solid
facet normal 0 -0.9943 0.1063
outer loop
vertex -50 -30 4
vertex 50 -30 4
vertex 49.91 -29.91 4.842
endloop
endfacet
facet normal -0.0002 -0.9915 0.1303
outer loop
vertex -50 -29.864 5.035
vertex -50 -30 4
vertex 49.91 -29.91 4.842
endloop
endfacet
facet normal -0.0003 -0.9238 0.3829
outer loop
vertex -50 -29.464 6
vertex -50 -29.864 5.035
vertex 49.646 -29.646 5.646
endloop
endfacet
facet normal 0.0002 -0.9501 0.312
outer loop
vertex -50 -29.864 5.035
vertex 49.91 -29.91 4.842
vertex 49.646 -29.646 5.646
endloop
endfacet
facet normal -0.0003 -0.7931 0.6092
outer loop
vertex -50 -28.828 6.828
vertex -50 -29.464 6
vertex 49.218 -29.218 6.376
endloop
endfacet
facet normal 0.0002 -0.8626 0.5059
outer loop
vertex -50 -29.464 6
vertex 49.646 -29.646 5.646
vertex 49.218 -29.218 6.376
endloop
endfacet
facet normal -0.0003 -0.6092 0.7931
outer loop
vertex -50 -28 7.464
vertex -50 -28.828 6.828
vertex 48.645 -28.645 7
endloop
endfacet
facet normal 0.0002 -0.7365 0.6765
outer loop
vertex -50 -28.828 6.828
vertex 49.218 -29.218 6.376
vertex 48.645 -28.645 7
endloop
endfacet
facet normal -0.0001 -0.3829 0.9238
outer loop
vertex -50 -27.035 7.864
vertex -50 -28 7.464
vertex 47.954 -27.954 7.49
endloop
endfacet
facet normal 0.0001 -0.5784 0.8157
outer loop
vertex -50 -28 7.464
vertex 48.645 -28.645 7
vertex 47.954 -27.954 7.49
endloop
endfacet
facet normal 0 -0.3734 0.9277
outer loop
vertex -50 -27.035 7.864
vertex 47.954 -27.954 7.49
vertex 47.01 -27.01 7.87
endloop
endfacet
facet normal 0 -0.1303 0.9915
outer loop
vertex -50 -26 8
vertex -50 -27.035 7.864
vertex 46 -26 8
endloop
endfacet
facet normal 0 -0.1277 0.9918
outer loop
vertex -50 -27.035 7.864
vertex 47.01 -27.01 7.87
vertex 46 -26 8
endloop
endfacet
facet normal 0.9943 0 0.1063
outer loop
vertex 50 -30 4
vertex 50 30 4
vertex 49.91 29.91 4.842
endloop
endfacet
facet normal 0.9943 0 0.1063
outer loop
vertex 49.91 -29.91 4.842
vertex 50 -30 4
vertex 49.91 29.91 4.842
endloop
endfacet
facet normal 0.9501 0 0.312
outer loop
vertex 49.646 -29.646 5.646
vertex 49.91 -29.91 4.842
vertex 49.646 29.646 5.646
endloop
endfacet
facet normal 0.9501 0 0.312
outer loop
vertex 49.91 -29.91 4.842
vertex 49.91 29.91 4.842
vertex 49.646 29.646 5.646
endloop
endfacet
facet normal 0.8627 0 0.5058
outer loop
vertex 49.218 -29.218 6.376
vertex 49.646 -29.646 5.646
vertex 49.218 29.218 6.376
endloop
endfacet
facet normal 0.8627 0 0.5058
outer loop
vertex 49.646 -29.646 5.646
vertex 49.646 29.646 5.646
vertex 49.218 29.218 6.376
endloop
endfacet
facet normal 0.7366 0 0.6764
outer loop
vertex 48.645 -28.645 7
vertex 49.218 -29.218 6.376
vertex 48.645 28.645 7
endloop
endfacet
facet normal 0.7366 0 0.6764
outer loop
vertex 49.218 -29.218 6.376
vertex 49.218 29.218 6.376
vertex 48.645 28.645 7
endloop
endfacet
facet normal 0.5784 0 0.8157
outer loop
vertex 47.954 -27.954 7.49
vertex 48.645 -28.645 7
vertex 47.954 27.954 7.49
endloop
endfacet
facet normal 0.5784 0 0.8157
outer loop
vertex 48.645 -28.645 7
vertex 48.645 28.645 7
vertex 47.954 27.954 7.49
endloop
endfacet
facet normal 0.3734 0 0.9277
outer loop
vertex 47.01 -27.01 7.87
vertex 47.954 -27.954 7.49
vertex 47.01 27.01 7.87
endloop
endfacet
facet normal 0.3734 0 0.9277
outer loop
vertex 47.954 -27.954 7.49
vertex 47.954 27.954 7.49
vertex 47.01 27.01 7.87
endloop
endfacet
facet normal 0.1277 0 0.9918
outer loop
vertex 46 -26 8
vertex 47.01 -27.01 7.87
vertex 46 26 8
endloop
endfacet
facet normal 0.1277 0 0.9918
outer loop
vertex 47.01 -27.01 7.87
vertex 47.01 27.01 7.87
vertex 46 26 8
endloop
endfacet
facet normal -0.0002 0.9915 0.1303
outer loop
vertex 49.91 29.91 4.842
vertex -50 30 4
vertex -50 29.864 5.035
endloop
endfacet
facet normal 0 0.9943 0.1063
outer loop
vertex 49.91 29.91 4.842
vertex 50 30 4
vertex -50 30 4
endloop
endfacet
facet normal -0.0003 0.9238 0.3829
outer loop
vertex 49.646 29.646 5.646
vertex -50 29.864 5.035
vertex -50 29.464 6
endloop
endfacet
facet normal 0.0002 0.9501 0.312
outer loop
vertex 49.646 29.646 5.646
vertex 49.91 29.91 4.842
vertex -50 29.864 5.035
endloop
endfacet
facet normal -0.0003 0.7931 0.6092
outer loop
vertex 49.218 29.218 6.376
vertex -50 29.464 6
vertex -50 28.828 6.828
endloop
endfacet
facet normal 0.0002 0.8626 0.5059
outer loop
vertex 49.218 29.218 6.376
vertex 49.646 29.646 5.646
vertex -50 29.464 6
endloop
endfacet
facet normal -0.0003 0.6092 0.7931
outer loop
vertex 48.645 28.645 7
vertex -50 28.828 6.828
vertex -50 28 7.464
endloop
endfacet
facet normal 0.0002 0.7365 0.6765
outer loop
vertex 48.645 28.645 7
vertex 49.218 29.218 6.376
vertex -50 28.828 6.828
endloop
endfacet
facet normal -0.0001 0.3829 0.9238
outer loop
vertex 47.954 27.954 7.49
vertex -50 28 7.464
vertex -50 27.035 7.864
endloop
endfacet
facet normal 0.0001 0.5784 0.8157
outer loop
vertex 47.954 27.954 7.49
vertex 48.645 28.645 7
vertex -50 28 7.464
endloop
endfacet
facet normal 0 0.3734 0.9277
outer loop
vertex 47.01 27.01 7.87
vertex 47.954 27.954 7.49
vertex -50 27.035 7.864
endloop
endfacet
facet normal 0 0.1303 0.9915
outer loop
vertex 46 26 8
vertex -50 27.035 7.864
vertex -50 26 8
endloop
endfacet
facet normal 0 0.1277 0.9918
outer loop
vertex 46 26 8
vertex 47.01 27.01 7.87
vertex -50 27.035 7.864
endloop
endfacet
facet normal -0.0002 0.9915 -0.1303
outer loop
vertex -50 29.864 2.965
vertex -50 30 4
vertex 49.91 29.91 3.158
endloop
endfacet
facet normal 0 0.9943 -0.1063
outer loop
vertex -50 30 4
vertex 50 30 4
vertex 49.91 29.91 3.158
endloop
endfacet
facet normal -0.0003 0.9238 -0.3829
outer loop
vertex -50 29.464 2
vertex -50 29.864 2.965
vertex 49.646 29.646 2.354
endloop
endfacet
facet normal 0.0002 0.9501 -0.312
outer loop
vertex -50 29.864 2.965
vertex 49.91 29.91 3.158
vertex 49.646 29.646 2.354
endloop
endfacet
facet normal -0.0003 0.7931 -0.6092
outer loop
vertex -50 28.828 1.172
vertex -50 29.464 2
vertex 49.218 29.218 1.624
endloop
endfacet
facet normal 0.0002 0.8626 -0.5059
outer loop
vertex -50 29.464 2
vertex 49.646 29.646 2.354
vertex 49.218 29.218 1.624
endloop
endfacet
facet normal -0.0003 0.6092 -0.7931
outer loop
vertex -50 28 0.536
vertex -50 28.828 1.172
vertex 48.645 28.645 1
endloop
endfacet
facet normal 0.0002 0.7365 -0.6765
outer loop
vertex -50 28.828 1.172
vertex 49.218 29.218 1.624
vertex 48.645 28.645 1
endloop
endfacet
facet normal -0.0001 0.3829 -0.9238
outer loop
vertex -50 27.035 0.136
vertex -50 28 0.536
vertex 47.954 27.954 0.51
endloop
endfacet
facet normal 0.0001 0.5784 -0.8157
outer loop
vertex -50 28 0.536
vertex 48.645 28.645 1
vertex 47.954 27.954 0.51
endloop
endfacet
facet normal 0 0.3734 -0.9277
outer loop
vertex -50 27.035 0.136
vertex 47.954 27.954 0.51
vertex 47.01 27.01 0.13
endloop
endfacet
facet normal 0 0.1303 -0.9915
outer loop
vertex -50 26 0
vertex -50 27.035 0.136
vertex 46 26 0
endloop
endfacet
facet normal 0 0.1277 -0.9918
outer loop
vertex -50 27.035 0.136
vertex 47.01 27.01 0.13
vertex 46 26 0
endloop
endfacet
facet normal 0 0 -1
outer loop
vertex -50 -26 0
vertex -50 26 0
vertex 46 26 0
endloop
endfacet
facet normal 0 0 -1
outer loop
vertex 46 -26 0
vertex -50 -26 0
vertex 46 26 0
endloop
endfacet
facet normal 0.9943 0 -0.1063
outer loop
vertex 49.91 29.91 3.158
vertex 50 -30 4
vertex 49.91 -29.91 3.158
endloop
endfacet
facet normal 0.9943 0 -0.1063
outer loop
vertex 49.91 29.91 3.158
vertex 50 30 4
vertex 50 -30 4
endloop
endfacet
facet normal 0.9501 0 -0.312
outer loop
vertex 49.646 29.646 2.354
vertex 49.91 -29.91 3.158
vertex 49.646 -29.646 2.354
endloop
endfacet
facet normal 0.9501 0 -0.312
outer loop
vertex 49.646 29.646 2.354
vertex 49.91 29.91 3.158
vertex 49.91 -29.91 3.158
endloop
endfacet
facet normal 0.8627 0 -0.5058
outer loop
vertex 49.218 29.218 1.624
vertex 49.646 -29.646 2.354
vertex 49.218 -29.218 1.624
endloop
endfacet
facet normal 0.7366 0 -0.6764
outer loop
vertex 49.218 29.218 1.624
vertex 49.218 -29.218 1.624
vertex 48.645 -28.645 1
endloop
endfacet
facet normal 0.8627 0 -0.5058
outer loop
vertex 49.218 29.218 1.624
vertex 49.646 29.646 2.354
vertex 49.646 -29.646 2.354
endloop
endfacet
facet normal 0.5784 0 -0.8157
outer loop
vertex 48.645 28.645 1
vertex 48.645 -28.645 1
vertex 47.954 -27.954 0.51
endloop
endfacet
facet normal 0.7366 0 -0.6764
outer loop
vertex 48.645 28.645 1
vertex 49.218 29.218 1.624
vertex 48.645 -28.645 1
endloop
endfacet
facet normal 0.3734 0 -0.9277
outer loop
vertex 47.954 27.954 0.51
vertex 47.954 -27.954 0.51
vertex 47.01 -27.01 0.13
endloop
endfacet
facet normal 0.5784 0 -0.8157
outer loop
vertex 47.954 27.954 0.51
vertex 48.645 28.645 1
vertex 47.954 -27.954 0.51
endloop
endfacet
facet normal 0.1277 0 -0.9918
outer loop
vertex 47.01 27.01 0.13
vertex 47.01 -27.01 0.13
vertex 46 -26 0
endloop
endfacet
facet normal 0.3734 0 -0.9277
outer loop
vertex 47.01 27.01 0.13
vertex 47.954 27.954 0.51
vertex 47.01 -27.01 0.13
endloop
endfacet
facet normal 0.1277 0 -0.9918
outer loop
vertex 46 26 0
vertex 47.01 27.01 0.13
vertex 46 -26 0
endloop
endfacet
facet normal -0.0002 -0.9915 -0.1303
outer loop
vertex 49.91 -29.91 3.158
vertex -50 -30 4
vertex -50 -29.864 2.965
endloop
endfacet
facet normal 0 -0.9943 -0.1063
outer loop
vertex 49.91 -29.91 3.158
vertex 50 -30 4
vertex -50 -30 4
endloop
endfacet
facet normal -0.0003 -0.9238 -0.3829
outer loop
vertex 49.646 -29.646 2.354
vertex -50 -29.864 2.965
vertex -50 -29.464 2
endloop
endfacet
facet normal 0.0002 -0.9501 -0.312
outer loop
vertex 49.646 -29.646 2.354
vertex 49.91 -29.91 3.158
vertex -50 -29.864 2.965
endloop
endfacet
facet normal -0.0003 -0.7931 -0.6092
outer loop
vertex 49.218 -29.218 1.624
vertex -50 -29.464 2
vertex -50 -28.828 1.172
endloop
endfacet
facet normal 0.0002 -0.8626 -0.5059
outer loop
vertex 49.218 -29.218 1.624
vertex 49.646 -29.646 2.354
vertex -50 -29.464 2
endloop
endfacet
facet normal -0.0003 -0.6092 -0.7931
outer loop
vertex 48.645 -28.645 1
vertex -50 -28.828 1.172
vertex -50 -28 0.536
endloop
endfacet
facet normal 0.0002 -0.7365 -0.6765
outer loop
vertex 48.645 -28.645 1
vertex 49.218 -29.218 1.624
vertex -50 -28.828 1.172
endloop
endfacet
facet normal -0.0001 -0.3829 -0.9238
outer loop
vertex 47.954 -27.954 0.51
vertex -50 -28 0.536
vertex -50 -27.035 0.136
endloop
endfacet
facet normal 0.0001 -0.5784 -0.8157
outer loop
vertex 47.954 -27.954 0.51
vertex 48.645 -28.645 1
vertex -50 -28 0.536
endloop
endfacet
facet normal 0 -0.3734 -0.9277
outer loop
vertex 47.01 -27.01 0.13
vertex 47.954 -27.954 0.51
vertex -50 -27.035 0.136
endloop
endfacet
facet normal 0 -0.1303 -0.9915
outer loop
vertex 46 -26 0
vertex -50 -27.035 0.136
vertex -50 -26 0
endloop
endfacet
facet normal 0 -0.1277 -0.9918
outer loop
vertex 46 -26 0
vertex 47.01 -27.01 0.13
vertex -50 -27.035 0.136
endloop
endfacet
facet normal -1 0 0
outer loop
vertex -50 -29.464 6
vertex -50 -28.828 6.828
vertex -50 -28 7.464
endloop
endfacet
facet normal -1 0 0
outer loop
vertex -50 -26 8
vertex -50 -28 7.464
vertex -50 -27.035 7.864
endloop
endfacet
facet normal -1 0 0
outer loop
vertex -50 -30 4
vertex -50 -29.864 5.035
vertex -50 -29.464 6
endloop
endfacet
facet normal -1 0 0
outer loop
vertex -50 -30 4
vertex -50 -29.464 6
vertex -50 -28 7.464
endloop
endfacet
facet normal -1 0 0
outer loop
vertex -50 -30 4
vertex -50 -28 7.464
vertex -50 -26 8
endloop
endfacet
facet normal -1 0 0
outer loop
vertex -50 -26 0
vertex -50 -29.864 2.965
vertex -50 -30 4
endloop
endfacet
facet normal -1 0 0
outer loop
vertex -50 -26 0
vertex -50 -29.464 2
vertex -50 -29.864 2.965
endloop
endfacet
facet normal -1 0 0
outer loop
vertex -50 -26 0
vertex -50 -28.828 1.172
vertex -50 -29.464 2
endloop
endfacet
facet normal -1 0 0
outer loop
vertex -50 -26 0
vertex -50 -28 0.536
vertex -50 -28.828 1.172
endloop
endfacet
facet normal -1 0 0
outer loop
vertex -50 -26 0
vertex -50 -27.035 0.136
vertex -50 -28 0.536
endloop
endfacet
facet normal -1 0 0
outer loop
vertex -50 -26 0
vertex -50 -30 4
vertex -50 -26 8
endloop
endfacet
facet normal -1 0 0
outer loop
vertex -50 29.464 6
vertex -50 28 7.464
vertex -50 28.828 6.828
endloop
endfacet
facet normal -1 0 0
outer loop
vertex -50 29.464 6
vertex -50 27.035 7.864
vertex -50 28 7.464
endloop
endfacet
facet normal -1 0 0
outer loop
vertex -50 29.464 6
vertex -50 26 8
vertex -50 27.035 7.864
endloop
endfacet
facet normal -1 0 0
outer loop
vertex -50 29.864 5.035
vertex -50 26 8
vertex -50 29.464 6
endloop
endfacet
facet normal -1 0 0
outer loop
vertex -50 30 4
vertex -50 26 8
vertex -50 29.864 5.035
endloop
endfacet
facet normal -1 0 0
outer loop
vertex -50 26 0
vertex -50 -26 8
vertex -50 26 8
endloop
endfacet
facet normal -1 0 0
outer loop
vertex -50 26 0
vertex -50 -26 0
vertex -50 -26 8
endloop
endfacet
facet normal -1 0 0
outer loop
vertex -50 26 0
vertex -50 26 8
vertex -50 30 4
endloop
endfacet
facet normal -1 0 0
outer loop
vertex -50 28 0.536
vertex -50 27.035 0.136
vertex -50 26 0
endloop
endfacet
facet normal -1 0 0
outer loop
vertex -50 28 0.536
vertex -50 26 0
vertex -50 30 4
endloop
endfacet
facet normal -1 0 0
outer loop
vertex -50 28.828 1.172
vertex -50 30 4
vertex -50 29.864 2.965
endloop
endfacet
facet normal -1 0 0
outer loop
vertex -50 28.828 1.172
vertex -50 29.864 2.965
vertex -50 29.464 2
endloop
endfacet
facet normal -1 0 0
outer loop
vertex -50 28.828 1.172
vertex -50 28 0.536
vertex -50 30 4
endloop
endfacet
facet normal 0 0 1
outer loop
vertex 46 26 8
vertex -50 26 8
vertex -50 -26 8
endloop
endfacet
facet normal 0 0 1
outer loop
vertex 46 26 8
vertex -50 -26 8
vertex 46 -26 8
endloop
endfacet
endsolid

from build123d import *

# Parameters (mm, degrees)
F0_W     = 100
F0_H     = 60
F1_DEPTH = 8
F2_R     = 3.99999


# Not quite as in the source:
# - a fillet or chamfer is up to 0.001 mm smaller than in the source, because OpenCascade refuses the exact size


with BuildPart() as f1:
    # F0 (on Top) → F1 (new body)
    with BuildSketch(Plane.XY):
        Rectangle(F0_W, F0_H)
    extrude(amount=F1_DEPTH)

    # F2 (radius 4 in the source; OpenCascade refuses exactly that, so slightly less here)
    f2_edges = [f1.edges().sort_by_distance(p)[0] for p in [
        (0, -30, 8),
        (0, -30, 0),
        (50, 0, 8),
        (50, 0, 0),
        (0, 30, 8),
        (0, 30, 0),
    ]]
    fillet(f2_edges, radius=F2_R)


solid = f1.part
